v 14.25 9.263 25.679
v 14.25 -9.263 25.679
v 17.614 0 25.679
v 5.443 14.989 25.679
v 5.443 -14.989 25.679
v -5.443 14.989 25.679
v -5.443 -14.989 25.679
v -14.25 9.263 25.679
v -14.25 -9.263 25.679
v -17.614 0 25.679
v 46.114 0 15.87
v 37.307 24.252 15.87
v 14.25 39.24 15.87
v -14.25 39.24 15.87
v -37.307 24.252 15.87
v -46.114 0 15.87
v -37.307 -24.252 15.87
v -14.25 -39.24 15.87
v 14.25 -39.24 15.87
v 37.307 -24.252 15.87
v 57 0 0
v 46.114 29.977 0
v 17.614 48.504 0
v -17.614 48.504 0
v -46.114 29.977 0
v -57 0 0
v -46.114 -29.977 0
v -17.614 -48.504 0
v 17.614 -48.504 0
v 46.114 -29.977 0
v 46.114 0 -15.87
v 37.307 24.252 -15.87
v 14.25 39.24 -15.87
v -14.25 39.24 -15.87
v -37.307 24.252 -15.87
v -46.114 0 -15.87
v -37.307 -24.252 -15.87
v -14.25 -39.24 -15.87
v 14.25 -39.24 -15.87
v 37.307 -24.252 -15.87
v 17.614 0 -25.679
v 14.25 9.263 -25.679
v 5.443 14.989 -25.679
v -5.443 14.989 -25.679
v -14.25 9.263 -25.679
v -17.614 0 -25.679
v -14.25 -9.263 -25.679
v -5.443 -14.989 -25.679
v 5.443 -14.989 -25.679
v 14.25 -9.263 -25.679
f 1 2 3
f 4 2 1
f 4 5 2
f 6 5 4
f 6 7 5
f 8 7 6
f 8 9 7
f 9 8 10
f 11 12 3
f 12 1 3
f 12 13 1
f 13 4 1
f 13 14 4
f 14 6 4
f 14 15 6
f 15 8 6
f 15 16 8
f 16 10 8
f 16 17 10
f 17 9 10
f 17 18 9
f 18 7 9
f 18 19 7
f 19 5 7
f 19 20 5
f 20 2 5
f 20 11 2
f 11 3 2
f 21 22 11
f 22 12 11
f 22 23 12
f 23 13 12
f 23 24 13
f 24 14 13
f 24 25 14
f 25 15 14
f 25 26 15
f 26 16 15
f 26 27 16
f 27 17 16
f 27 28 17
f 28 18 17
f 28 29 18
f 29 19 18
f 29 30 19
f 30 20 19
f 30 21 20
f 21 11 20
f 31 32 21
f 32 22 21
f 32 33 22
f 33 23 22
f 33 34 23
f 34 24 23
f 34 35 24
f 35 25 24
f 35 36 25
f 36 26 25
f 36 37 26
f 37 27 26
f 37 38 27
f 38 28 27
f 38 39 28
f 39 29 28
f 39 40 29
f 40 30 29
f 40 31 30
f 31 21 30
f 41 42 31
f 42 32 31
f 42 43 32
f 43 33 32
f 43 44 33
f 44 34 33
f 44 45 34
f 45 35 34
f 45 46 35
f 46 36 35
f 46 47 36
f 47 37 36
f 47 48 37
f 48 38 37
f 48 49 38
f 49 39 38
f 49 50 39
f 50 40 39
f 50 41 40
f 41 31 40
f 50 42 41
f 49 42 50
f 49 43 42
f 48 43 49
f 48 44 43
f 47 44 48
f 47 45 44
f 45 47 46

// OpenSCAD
// Generated by SolidPython 1.0.1 on 2020-07-29 00:46:54


scale(v = [19, 17, 9]) {
	sphere(r = 3);
}
/***********************************************
*********      SolidPython code:      **********
************************************************
 
# import packages: SolidPython
from solid import *
from solid.utils import *
from itertools import chain, combinations, permutations


class Resize:

    def __init__(self, scad_file):
        self.scad_file = scad_file
        #self.scad_file = import_scad(scad_file)
        # cone/cylinder param:
        self.r1 = 0
        self.r2 = 0
        self.h = 0
        # rectangular prism param:
        self.w = 0
        self.l = 0
        # ellipse param:
        self.r = 0

    # import OpenScad code (file name corresponds to shape)


    # classify shape + parameters
    def assign(self, param1, param2, param3):
        if self.scad_file == 'cone.scad':
            self.r1 = param1
            self.r2 = param2
            self.h = param3
        elif self.scad_file == 'cylinder.scad':
            self.r1 = param1
            self.r2 = param2
            self.h = param3
        elif self.scad_file == 'rectangularPrism.scad':
            self.h = param1
            self.l = param2
            self.w = param3
        else:
            self.r = param1
            self.h = param2

    # resize parameters
    def iterate(self):
        x = range(3, 20, 2)
        i = 1
        if self.scad_file == 'cone.scad':
            tempList = list(permutations(x, 2))
            for temp in tempList:
                param1 = temp[0]
                param2 = temp[1]
                filepath = 'produced_scad_files/' + 'cone' + str(param1) + '_' + str(param2) + '_' + '.scad'
                scad_render_to_file(cylinder(h=param1, r1=param2, r2=0), filepath)

        elif self.scad_file == 'cylinder.scad':
            tempList = list(permutations(x, 3))
            for temp in tempList:
                param1 = temp[0]
                param2 = temp[1]
                filepath = 'produced_scad_files/' + 'cylinder' + str(param1) + '_' + str(param2) + '_' + '.scad'
                scad_render_to_file(cylinder(h=param1, r1=param2, r2=param2), filepath)

        elif self.scad_file == 'rectangularPrism.scad':
            tempList = list(permutations(x, 3))
            for temp in tempList:
                param1 = temp[0]
                param2 = temp[1]
                param3 = temp[2]
                filepath = 'produced_scad_files/' + 'rectangularPrism' + str(param1) + '_' + str(param2) + '_' + str(
                    param3) + '.scad'
                scad_render_to_file(cube(size=(param1, param2, param3)), filepath)

        elif self.scad_file == 'ellipse.scad':
            tempList = list(permutations(x, 4))
            for temp in tempList:
                param1 = temp[0]
                param2 = temp[1]
                param3 = temp[2]
                param4 = temp[3]
                filepath = 'produced_scad_files/' + 'ellipse' + str(param1) + '_' + str(param2) + '_' + str(param3) + '_' + str(param4) + '.scad'
                scad_render_to_file(scale([param1, param2, param3])(sphere(r=param4)), filepath)

    def render_to_scadfile(self):
        scad_render_to_file(scad, 'example.scad') 
 
************************************************/
